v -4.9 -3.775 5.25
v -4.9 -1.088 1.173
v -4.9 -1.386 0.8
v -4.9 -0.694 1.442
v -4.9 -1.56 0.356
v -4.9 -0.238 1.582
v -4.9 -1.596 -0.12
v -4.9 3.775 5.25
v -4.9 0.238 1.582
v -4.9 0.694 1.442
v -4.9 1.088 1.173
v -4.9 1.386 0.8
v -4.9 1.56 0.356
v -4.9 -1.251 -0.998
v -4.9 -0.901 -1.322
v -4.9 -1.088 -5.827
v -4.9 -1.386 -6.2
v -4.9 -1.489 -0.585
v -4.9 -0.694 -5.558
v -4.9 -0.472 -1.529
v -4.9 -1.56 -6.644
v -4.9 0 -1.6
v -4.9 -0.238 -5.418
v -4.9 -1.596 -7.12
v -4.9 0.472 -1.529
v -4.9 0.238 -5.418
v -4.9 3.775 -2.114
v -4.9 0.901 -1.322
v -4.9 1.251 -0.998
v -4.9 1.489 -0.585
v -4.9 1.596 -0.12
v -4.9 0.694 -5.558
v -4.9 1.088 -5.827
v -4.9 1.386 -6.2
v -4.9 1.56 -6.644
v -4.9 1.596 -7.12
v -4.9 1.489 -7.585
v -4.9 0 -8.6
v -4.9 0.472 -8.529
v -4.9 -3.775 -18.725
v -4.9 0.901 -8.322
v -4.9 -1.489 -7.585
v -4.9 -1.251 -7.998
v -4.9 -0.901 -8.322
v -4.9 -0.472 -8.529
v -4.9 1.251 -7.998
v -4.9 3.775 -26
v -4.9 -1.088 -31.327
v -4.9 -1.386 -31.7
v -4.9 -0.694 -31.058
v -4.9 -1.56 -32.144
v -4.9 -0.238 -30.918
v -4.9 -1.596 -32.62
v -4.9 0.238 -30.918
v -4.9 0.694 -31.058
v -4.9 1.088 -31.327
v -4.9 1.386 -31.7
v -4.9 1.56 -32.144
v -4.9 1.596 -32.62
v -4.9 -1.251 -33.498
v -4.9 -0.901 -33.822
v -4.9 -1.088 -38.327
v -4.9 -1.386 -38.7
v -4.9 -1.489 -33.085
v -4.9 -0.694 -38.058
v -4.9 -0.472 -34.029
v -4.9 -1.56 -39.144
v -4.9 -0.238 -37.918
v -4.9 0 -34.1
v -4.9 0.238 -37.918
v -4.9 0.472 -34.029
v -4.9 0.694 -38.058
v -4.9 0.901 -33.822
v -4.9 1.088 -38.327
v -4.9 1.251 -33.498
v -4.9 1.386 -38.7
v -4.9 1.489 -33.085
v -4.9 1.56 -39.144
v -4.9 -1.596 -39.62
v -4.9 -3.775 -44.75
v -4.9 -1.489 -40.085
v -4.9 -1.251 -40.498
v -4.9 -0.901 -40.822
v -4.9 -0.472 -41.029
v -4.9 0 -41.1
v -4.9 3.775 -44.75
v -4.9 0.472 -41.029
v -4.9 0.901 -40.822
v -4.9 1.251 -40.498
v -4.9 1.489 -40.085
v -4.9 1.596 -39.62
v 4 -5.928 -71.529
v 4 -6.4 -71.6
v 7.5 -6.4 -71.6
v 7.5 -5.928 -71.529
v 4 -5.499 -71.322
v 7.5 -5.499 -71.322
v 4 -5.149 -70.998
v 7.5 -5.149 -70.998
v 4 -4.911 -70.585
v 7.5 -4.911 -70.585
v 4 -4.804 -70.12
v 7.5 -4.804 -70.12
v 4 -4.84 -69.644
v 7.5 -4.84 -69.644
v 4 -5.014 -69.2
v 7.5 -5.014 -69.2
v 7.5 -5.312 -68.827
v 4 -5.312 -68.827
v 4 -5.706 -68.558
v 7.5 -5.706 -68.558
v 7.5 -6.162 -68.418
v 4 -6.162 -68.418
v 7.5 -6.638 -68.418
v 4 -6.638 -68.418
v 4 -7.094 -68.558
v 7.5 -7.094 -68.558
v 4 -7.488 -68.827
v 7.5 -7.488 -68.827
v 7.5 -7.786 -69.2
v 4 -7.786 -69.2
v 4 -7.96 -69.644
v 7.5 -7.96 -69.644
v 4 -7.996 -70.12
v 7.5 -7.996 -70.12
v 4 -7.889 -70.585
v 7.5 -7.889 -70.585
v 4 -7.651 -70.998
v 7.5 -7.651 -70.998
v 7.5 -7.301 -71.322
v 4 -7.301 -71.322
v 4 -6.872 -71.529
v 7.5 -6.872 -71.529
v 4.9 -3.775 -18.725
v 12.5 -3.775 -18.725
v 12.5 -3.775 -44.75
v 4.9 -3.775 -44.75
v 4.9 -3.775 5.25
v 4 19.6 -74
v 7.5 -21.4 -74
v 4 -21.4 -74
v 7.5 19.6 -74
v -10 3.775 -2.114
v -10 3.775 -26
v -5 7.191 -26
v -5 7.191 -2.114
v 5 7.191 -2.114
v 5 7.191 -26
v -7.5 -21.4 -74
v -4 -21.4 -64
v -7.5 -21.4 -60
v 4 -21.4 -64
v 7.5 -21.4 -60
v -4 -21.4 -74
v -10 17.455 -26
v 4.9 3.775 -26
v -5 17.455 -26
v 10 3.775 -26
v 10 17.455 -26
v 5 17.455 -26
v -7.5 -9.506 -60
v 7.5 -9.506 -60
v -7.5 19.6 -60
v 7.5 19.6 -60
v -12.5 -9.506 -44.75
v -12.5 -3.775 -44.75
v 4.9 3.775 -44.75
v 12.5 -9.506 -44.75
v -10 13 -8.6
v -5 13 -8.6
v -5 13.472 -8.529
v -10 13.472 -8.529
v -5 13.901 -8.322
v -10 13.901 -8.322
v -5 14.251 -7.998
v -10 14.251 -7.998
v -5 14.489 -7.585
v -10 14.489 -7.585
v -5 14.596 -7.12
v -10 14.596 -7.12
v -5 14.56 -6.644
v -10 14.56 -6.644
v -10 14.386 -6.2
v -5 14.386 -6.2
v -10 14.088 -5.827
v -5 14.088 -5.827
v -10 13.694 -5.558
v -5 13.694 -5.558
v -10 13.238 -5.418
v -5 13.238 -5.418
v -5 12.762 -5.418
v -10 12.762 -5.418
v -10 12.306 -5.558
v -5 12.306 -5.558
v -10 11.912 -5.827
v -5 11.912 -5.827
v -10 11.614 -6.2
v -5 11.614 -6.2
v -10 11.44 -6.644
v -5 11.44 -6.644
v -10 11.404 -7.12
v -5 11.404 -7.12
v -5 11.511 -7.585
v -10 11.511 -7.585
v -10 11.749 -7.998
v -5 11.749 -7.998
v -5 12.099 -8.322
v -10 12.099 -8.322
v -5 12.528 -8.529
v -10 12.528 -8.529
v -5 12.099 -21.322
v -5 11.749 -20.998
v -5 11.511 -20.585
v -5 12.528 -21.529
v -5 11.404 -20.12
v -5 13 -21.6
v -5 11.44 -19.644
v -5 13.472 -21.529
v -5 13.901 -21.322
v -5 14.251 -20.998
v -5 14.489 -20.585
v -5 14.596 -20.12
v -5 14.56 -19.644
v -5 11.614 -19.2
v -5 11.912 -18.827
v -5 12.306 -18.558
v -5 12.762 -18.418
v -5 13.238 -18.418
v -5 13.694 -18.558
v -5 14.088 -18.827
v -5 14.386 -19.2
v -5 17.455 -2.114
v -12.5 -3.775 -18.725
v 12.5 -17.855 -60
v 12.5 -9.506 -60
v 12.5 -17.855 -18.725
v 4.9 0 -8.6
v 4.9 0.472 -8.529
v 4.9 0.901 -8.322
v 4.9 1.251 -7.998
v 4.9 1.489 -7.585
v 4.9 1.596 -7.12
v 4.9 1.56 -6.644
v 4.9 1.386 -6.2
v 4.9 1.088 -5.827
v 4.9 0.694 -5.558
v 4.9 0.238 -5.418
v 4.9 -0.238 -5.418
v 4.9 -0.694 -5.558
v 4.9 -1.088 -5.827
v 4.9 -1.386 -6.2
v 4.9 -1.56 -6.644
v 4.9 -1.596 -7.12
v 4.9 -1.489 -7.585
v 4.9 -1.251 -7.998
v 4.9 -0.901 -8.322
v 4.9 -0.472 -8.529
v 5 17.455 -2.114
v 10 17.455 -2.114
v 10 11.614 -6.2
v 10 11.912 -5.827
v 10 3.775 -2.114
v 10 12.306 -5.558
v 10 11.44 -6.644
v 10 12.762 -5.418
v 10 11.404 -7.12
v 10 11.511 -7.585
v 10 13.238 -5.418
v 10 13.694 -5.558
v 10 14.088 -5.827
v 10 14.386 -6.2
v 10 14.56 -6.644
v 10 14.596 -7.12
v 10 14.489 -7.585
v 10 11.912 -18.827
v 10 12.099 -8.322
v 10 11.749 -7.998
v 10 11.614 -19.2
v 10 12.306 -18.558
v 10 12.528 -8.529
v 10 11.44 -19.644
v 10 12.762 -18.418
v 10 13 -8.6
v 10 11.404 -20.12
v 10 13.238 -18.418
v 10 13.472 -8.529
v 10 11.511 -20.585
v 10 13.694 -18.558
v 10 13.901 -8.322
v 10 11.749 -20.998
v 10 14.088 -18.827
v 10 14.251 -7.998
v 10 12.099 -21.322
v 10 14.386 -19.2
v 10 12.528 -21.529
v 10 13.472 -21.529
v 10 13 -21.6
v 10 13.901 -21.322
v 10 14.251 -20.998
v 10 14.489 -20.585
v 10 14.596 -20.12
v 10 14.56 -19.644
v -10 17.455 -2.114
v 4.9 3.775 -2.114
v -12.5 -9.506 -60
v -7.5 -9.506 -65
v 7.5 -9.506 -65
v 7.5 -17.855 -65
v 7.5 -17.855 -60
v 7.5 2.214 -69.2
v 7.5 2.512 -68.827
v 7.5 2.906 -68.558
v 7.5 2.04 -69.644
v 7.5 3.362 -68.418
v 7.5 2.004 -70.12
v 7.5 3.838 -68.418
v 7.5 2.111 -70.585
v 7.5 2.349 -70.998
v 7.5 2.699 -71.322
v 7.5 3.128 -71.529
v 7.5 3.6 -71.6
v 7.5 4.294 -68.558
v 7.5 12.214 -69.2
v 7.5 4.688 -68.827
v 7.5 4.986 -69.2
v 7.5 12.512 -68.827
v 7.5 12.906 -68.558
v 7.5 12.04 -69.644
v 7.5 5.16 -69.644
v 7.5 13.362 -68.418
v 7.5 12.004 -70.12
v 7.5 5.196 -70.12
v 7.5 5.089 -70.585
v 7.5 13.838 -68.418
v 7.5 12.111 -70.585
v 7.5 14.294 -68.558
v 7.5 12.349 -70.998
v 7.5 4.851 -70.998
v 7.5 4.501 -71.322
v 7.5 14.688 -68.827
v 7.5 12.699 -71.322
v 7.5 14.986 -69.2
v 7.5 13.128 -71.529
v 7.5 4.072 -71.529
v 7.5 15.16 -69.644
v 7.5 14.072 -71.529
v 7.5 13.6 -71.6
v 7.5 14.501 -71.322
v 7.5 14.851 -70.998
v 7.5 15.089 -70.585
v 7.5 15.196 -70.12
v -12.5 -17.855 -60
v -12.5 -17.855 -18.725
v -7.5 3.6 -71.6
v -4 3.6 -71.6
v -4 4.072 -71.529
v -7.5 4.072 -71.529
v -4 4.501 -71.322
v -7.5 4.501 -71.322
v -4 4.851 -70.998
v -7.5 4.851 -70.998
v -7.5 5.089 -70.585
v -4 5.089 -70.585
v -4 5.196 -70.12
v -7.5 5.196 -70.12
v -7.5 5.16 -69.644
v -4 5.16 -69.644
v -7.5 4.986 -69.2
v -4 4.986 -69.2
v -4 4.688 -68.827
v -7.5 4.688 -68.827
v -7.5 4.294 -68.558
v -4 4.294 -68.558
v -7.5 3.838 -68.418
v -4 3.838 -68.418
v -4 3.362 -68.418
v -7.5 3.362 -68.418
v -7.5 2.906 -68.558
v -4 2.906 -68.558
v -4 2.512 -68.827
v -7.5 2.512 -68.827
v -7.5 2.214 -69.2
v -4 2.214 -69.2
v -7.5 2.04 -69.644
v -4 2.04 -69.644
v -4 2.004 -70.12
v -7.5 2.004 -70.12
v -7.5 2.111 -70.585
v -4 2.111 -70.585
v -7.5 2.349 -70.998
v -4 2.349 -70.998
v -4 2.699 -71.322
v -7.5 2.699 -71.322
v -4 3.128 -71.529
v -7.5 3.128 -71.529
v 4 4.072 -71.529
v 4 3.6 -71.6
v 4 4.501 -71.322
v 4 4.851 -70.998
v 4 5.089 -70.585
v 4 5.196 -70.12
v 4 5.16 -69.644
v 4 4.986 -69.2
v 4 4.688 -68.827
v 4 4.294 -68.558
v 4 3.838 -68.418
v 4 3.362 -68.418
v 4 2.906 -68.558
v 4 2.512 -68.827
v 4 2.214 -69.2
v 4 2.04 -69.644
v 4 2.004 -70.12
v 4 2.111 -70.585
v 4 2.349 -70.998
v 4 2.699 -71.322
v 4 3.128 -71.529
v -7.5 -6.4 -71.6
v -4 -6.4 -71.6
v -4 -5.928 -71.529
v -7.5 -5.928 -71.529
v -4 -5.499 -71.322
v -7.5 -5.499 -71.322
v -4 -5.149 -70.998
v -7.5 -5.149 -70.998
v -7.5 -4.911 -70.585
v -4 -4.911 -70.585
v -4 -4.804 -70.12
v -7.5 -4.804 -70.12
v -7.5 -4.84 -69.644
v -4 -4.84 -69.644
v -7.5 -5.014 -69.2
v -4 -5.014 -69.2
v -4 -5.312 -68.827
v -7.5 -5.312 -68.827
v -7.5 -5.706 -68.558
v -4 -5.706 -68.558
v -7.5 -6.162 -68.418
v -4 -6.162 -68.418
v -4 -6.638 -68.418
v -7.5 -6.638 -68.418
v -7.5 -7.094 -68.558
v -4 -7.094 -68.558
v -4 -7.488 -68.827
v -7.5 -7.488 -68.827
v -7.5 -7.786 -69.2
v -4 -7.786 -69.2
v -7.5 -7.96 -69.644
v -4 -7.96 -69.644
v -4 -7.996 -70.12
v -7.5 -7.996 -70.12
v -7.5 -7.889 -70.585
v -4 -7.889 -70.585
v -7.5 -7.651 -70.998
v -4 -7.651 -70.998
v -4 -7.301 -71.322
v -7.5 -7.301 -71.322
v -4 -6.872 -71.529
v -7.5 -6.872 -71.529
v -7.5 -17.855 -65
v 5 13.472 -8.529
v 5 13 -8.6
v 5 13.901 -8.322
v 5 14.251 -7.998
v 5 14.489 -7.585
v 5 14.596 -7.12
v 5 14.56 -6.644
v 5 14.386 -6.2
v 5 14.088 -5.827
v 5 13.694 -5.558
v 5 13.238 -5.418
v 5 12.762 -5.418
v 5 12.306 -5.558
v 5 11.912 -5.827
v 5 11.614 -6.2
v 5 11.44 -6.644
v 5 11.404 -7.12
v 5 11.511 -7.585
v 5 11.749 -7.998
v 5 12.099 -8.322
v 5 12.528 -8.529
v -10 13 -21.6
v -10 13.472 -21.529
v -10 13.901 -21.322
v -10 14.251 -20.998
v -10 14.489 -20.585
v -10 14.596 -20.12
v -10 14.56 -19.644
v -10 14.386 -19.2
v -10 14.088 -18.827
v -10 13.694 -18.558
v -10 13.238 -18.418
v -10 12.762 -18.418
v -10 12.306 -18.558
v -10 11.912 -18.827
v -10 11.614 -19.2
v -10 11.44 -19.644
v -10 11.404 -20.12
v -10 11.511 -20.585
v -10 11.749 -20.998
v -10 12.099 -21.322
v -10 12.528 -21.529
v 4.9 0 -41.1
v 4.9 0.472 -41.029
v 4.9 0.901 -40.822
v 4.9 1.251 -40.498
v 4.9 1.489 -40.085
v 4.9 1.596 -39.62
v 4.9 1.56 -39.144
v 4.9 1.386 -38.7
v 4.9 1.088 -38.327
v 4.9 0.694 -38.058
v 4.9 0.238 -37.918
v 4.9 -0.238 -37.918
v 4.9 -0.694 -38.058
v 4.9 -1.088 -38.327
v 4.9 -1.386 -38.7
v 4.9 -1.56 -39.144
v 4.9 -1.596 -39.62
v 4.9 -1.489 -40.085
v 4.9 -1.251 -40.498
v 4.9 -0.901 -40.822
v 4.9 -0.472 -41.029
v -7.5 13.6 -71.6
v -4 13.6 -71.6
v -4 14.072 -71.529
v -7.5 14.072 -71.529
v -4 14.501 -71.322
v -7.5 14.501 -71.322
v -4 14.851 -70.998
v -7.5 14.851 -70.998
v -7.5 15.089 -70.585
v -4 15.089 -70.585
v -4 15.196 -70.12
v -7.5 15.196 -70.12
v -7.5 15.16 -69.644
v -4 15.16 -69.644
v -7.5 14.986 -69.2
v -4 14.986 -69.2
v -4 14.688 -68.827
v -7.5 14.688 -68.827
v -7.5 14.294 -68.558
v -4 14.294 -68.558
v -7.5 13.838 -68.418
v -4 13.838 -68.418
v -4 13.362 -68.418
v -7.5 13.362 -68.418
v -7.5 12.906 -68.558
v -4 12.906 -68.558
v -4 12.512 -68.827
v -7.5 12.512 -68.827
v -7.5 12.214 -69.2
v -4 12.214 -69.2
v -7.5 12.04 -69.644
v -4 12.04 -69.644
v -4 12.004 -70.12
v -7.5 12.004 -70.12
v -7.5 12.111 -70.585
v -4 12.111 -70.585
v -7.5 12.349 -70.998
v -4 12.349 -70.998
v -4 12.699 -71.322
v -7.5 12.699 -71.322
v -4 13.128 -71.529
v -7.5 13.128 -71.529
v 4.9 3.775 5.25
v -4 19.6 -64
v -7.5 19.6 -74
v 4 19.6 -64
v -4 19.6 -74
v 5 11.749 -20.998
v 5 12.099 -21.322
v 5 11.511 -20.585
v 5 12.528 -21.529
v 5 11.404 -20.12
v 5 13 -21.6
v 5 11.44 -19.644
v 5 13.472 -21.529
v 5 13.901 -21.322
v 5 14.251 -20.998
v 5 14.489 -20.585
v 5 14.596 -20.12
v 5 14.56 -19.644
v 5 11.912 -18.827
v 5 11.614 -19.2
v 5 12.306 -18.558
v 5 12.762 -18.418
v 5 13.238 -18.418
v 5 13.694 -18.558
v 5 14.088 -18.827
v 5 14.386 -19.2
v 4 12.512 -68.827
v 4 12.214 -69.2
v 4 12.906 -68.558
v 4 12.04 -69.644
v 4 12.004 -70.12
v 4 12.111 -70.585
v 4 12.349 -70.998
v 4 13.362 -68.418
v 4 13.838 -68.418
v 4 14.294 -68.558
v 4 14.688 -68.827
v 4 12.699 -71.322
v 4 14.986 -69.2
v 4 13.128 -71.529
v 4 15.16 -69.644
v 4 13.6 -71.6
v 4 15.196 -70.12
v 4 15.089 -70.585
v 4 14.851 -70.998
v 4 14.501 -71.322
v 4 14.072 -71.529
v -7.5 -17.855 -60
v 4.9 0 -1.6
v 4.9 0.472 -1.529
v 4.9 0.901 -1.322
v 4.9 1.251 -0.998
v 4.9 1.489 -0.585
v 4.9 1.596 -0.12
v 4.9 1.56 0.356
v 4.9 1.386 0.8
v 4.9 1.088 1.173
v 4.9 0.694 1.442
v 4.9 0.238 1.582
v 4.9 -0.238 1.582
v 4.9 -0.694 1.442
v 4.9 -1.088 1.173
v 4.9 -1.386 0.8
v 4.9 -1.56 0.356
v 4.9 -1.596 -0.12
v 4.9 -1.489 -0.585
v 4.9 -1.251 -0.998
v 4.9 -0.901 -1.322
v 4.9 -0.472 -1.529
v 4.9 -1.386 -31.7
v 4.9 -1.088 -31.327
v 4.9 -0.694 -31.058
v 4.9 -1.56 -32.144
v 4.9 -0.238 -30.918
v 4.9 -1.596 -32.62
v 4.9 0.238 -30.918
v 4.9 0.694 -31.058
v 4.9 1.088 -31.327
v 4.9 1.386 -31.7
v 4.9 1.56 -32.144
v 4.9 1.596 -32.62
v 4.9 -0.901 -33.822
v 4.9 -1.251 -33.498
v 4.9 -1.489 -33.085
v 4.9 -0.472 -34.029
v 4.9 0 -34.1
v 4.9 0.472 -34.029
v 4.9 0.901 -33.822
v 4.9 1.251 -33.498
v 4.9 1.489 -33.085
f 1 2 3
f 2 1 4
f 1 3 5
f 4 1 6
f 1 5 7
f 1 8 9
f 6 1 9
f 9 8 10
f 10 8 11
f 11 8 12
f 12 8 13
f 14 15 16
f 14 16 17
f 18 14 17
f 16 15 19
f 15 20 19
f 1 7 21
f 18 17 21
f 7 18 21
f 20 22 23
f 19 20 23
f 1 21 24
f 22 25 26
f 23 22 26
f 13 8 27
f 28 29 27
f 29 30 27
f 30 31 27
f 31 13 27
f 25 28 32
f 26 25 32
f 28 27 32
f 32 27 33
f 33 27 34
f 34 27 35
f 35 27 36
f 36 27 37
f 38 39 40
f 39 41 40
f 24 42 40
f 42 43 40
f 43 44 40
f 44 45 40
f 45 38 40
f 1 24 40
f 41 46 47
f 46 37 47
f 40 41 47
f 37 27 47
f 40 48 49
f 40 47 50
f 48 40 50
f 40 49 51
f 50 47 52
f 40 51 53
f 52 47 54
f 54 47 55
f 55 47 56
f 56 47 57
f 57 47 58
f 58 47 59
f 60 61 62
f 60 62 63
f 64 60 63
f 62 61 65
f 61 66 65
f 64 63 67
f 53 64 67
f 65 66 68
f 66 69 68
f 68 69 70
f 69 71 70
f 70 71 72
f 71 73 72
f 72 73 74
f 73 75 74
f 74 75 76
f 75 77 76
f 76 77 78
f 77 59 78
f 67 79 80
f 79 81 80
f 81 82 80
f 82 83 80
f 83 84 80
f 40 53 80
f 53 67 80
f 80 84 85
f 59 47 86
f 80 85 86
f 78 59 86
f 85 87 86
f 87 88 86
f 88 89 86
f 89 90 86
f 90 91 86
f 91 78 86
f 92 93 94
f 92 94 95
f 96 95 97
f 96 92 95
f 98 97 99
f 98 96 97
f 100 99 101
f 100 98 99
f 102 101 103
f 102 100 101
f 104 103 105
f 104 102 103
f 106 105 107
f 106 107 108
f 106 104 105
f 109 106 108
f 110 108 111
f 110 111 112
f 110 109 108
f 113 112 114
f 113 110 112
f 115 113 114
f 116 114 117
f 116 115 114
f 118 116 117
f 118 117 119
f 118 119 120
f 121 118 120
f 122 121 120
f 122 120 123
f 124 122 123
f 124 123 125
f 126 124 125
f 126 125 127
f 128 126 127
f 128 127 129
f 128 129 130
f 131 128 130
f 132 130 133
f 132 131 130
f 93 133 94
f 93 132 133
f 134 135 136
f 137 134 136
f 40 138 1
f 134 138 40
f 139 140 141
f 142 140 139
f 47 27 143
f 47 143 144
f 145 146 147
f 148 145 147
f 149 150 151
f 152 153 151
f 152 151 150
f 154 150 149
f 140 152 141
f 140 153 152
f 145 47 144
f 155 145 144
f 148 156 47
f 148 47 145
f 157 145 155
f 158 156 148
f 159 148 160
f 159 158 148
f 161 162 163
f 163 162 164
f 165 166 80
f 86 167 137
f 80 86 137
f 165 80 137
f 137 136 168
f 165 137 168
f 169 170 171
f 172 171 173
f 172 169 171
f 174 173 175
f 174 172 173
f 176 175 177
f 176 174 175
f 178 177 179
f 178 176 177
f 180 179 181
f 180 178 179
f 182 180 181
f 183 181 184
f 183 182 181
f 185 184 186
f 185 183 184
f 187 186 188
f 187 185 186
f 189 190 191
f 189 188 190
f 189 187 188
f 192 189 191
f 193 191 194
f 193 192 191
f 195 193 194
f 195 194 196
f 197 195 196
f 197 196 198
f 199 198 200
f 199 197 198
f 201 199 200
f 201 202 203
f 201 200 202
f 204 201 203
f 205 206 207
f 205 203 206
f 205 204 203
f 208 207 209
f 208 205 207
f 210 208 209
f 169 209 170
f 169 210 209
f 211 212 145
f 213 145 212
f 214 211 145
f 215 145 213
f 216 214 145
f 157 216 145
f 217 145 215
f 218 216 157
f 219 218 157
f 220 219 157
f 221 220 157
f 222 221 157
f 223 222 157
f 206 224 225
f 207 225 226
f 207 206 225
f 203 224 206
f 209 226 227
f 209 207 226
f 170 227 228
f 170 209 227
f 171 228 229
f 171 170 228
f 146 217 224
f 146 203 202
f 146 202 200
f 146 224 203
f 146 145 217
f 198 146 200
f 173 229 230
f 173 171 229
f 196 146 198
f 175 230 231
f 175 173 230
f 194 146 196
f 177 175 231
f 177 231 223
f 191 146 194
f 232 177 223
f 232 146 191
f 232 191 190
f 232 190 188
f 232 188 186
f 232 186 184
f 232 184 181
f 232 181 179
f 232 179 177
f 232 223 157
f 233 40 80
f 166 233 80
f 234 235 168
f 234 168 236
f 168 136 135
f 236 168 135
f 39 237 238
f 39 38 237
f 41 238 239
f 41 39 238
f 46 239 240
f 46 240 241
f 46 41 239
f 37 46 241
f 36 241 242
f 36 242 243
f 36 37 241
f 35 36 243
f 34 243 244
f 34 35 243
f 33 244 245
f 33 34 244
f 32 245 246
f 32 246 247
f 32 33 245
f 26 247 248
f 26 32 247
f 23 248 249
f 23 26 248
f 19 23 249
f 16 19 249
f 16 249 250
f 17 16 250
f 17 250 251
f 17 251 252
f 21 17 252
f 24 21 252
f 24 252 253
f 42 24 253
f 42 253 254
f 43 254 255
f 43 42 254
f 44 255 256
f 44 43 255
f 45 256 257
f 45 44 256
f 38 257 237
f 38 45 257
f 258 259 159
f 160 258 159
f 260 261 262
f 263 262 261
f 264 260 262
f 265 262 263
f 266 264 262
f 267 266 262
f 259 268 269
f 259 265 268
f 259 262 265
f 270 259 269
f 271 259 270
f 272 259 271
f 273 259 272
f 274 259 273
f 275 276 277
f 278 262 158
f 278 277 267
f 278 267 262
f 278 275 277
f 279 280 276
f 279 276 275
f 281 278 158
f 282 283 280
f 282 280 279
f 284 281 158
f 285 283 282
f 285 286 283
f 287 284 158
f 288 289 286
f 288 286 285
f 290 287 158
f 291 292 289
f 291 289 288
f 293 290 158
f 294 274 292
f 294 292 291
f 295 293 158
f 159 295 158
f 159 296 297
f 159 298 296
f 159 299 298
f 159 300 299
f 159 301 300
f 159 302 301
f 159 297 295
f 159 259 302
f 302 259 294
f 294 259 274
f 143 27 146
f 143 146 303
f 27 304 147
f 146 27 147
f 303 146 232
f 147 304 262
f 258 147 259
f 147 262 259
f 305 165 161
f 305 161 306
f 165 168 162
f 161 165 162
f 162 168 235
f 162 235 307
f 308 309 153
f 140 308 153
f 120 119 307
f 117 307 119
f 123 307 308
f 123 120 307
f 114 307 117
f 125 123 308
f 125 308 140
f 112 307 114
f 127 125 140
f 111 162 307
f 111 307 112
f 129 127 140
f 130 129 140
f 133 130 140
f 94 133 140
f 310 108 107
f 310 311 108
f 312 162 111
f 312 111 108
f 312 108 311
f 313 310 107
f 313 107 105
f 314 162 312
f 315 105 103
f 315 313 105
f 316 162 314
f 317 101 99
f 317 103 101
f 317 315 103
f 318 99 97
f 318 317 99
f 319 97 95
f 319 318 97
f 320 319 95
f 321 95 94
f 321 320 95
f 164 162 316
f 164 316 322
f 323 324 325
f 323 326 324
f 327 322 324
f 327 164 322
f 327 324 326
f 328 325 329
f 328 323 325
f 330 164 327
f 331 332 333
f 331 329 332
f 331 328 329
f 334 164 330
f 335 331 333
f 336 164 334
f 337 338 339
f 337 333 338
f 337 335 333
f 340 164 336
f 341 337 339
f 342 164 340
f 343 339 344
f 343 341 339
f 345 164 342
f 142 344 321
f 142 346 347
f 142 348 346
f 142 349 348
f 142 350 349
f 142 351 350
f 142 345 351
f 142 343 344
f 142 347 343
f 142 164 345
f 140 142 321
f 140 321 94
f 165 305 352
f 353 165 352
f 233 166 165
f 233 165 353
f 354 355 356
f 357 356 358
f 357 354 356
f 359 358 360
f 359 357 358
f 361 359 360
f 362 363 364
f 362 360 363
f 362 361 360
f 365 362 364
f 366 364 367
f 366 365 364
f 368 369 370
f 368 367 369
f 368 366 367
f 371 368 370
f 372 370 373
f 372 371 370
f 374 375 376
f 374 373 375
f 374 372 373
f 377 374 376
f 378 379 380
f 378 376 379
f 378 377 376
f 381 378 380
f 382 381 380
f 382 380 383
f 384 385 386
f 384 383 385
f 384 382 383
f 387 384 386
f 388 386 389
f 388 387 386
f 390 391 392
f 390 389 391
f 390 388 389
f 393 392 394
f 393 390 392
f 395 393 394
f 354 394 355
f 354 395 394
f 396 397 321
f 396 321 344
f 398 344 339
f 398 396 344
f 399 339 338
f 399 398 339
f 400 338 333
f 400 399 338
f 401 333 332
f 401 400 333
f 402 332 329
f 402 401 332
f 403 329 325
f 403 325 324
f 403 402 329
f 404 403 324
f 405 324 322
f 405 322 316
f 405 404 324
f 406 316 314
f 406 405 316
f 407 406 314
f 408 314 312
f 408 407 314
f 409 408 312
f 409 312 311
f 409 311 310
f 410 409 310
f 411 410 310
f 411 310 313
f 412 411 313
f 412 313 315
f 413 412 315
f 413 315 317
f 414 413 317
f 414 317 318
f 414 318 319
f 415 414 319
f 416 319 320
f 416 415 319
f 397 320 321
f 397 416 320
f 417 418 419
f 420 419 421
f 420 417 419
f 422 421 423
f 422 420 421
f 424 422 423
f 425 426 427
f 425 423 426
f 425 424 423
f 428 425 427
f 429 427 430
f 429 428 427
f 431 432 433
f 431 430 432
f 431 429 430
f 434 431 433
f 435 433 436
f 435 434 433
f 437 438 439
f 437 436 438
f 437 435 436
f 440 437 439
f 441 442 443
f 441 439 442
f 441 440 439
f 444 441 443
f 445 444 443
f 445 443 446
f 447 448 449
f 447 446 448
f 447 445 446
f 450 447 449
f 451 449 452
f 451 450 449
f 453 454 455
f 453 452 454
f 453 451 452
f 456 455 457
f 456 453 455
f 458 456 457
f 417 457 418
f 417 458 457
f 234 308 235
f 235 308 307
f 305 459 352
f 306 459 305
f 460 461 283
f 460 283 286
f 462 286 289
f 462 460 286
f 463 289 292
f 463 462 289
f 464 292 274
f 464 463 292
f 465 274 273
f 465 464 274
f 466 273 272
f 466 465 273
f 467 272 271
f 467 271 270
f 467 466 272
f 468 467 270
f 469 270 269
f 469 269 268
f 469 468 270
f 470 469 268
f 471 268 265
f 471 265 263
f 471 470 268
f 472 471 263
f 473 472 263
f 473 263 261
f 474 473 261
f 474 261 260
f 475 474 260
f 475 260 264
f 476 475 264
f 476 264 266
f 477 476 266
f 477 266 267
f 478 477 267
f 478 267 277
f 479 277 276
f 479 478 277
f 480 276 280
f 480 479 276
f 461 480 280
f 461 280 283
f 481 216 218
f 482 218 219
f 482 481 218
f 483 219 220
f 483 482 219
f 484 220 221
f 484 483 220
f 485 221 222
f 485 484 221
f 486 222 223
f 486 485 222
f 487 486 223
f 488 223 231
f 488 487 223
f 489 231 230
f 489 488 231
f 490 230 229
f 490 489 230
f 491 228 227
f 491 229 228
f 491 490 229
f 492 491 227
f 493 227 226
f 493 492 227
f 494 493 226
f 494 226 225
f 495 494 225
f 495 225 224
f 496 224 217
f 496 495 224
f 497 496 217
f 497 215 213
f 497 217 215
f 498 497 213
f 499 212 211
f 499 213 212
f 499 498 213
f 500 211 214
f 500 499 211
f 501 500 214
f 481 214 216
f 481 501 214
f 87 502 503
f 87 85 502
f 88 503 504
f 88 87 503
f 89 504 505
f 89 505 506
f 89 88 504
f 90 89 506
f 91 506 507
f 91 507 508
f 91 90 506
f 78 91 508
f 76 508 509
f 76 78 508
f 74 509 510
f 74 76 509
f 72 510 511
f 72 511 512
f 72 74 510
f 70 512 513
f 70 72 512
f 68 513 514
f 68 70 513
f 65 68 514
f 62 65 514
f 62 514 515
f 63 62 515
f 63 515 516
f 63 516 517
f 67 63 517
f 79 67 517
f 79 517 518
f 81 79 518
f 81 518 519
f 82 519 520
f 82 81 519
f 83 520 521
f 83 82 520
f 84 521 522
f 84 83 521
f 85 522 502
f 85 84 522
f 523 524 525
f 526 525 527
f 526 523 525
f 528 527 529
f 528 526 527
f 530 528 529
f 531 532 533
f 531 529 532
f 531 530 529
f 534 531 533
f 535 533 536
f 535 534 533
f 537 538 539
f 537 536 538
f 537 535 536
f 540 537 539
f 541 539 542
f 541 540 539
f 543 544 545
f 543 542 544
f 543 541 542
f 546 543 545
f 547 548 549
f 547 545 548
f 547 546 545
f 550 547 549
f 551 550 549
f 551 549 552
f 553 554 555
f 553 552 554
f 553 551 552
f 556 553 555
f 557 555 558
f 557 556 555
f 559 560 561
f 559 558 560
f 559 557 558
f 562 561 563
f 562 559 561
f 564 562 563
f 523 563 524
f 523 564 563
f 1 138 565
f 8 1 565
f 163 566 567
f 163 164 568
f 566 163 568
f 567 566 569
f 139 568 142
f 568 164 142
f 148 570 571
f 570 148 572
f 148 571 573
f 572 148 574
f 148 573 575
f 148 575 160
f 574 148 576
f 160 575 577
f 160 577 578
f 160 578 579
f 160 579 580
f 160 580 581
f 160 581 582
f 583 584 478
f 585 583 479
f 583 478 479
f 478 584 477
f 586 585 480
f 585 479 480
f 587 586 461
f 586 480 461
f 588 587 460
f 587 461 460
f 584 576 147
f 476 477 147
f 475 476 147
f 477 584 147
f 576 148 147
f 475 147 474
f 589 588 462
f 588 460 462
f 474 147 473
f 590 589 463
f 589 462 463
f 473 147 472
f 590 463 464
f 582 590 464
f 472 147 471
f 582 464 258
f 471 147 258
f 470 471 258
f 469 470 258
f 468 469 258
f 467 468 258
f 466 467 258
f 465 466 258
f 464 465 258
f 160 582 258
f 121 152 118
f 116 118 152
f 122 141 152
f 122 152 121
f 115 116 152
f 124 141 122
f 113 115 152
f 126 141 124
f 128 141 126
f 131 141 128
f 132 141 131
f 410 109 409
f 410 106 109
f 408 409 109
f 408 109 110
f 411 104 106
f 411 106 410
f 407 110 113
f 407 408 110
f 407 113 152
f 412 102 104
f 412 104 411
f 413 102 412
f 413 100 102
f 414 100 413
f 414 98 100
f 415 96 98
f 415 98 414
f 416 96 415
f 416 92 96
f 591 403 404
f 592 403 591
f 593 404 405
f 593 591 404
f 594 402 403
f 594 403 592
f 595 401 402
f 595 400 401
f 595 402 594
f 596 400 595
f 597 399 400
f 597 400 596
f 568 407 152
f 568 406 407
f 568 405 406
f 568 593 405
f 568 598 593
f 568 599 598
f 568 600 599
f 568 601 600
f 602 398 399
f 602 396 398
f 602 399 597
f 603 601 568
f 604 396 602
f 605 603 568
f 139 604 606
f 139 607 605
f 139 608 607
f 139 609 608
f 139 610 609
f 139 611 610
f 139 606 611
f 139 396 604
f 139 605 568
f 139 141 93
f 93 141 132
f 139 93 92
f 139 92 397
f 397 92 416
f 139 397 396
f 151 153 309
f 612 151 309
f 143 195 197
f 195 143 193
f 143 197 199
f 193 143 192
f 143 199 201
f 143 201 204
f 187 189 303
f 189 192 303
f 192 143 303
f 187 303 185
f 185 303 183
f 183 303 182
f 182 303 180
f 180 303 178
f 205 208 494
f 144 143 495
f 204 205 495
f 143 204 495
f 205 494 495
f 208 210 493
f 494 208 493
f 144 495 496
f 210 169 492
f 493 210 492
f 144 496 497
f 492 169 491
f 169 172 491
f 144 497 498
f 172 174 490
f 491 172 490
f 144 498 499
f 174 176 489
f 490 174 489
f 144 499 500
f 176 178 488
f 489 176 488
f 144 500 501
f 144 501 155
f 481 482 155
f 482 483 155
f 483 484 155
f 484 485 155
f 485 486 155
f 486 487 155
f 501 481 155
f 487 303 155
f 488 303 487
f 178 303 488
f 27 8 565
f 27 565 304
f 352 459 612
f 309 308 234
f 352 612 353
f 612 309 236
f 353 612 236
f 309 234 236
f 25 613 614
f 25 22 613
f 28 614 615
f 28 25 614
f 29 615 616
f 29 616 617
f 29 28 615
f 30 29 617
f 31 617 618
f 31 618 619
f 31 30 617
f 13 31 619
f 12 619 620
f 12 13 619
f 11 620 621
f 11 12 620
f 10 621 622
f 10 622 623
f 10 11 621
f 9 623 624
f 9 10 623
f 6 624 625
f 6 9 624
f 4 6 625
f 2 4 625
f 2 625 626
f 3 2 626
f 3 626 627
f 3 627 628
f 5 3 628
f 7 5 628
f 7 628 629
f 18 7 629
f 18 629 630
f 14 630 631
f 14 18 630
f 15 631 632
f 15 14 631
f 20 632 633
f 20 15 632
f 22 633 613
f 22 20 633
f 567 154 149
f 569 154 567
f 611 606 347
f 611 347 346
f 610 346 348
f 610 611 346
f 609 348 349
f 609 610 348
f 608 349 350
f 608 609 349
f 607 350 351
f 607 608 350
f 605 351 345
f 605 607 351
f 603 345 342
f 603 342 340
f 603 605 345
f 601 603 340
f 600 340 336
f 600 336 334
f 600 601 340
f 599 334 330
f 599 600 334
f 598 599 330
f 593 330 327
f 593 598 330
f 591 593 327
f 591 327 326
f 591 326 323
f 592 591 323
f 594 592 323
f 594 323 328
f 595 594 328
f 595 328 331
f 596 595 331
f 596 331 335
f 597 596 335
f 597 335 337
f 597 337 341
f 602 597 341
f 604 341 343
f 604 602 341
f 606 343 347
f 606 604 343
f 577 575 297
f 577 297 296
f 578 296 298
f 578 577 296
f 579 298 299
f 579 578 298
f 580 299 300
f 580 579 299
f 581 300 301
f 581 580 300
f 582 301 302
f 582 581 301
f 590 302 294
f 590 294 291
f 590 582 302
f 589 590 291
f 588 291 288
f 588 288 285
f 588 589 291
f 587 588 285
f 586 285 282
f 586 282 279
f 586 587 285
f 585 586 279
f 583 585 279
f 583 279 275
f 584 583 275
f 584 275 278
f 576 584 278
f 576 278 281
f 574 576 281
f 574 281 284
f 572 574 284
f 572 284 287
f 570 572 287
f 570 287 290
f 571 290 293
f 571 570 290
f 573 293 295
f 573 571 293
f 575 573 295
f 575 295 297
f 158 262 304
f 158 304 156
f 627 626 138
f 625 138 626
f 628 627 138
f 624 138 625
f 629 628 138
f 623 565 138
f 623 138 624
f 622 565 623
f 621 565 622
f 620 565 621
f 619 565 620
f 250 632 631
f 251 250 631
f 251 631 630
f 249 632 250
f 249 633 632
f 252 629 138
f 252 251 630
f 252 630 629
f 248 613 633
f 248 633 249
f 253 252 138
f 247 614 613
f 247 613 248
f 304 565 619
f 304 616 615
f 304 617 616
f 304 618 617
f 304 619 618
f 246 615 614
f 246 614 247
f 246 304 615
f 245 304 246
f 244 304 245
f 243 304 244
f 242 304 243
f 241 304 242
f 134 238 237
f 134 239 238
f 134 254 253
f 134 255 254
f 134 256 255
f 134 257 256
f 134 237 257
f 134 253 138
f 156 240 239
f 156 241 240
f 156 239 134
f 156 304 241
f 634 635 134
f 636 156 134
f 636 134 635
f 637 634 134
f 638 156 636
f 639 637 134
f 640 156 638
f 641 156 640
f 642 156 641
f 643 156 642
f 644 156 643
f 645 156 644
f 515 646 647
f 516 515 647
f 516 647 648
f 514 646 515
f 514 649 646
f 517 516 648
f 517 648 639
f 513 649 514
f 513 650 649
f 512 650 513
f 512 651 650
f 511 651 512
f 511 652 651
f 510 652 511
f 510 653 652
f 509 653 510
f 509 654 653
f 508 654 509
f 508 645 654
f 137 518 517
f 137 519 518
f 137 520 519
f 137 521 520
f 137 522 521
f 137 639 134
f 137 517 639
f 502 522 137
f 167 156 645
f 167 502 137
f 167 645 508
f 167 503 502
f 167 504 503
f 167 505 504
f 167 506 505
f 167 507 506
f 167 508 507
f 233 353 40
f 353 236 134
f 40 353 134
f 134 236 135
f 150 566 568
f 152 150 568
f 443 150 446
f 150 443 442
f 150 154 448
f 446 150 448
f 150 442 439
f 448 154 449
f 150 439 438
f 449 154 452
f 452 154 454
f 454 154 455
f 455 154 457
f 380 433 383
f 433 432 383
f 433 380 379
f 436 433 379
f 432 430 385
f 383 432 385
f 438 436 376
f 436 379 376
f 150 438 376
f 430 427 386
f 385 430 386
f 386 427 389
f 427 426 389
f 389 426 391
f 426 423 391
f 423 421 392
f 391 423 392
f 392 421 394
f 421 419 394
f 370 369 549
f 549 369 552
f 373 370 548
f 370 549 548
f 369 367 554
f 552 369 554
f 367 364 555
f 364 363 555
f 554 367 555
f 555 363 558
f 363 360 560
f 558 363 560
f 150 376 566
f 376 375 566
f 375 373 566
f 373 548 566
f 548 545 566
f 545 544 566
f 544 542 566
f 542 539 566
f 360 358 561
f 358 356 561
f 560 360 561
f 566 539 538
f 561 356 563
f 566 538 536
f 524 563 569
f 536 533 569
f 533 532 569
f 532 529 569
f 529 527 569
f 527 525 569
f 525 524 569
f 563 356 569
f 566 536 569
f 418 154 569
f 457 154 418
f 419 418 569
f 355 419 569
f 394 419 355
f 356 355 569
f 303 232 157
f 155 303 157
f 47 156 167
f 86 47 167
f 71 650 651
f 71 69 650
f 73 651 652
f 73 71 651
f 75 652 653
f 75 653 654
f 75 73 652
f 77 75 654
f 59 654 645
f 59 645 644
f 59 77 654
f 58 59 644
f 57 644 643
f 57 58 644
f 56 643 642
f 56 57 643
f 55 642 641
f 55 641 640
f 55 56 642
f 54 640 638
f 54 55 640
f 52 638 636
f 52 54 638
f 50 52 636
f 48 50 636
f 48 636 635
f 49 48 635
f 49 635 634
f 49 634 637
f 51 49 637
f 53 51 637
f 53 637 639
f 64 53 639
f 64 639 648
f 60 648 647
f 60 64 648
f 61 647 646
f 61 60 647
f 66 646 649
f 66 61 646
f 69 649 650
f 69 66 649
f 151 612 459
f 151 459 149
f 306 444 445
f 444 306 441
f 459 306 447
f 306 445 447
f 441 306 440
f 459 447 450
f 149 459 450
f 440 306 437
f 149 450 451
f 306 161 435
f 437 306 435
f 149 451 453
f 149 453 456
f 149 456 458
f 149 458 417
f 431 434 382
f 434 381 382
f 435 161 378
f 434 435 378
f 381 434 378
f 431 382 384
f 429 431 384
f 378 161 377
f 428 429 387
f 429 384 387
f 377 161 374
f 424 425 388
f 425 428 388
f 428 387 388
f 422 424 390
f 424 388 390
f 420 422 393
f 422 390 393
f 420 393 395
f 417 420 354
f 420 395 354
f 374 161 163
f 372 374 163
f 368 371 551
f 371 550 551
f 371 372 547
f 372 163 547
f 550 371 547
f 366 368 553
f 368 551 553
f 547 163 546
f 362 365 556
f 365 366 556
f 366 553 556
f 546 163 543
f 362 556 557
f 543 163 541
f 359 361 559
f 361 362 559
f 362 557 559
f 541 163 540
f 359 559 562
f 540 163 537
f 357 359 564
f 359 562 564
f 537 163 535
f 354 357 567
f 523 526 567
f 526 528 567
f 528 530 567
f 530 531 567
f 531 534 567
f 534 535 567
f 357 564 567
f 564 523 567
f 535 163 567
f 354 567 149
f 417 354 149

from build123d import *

# Parameters (mm, degrees)
SKETCH_2_W          = 50
SKETCH_2_H          = 7.55
SKETCH_2_R          = 1.6
EXTRUDE_1_DEPTH     = 4.9
SKETCH_3_W          = 23.885574904
SKETCH_3_H          = 13.680093874
SKETCH_3_R          = 1.6
EXTRUDE_2_DEPTH     = 10
SKETCH_4_W          = 10
SKETCH_4_H          = 10.264550668
CUT_EXTRUDE_1_DEPTH = 48.143107127
SKETCH_6_W          = 14
SKETCH_6_H          = 41
SKETCH_6_R          = 1.6
EXTRUDE_4_DEPTH     = 7.5
SKETCH_7_W          = 8
SKETCH_7_H          = 41
CUT_EXTRUDE_2_DEPTH = 10
EXTRUDE_5_DEPTH     = 12.5
CHAMFER_1_SIZE      = 5


with BuildPart() as part:
    # 草图2 → 凸台-拉伸1 (new, symmetric)
    with BuildSketch(Plane(origin=(0, 0, 0), x_dir=(0, 0, -1), z_dir=(1, 0, 0))):
        with Locations((19.75, 0)):
            Rectangle(SKETCH_2_W, SKETCH_2_H)
        Circle(SKETCH_2_R, mode=Mode.SUBTRACT)
        with Locations((7, 0)):
            Circle(SKETCH_2_R, mode=Mode.SUBTRACT)
        with Locations((32.5, 0)):
            Circle(SKETCH_2_R, mode=Mode.SUBTRACT)
        with Locations((39.5, 0)):
            Circle(SKETCH_2_R, mode=Mode.SUBTRACT)
    extrude(amount=EXTRUDE_1_DEPTH, both=True)

    # 草图3 → 凸台-拉伸2 (add, symmetric)
    with BuildSketch(Plane(origin=(0, 0, 0), x_dir=(0, 0, -1), z_dir=(1, 0, 0))):
        with Locations((14.057212548, 10.615046937)):
            Rectangle(SKETCH_3_W, SKETCH_3_H)
        with Locations((7, 13)):
            Circle(SKETCH_3_R, mode=Mode.SUBTRACT)
        with Locations((20, 13)):
            Circle(SKETCH_3_R, mode=Mode.SUBTRACT)
    extrude(amount=EXTRUDE_2_DEPTH, both=True)

    # 草图4 → 切除-拉伸1 (cut, through all)
    with BuildSketch(Plane.XY.offset(-2.114425096)):
        with Locations((0, 12.32281854)):
            Rectangle(SKETCH_4_W, SKETCH_4_H)
    extrude(amount=-CUT_EXTRUDE_1_DEPTH, mode=Mode.SUBTRACT)



with BuildPart() as body_2:
    # 草图6 → 凸台-拉伸4 (new, symmetric)
    with BuildSketch(Plane(origin=(0, 0, 0), x_dir=(0, 0, -1), z_dir=(1, 0, 0))):
        with Locations((67, -0.9)):
            Rectangle(SKETCH_6_W, SKETCH_6_H)
        with Locations((70, 3.6)):
            Circle(SKETCH_6_R, mode=Mode.SUBTRACT)
        with Locations((70, 13.6)):
            Circle(SKETCH_6_R, mode=Mode.SUBTRACT)
        with Locations((70, -6.4)):
            Circle(SKETCH_6_R, mode=Mode.SUBTRACT)
    extrude(amount=EXTRUDE_4_DEPTH, both=True)

    # 草图7 → 切除-拉伸2 (cut)
    with BuildSketch(Plane.XY.offset(-74)):
        with Locations((0, -0.9)):
            Rectangle(SKETCH_7_W, SKETCH_7_H)
    extrude(amount=CUT_EXTRUDE_2_DEPTH, mode=Mode.SUBTRACT)


with BuildPart() as part_1:
    add(part.part)

    add(body_2.part)  # 凸台-拉伸5 merges body 2
    # 草图8 → 凸台-拉伸5 (add, symmetric)
    with BuildSketch(Plane(origin=(0, 0, 0), x_dir=(0, 0, -1), z_dir=(1, 0, 0))):
        Polygon((44.75, -3.775), (44.75, -9.506092627), (60, -9.506092627), (60, -17.854611286), (18.724521107, -17.854611286), (18.724521107, -3.775), align=None)
    extrude(amount=EXTRUDE_5_DEPTH, both=True)

    # 倒角1
    chamfer_1_edges = [part_1.edges().sort_by_distance(p)[0] for p in [
        (-7.5, -13.680351956, -60),
        (7.5, -13.680351956, -60),
    ]]
    chamfer(chamfer_1_edges, length=CHAMFER_1_SIZE - 0.0001)  # a hair under: the kernel refuses the full size


solid = part_1.part
